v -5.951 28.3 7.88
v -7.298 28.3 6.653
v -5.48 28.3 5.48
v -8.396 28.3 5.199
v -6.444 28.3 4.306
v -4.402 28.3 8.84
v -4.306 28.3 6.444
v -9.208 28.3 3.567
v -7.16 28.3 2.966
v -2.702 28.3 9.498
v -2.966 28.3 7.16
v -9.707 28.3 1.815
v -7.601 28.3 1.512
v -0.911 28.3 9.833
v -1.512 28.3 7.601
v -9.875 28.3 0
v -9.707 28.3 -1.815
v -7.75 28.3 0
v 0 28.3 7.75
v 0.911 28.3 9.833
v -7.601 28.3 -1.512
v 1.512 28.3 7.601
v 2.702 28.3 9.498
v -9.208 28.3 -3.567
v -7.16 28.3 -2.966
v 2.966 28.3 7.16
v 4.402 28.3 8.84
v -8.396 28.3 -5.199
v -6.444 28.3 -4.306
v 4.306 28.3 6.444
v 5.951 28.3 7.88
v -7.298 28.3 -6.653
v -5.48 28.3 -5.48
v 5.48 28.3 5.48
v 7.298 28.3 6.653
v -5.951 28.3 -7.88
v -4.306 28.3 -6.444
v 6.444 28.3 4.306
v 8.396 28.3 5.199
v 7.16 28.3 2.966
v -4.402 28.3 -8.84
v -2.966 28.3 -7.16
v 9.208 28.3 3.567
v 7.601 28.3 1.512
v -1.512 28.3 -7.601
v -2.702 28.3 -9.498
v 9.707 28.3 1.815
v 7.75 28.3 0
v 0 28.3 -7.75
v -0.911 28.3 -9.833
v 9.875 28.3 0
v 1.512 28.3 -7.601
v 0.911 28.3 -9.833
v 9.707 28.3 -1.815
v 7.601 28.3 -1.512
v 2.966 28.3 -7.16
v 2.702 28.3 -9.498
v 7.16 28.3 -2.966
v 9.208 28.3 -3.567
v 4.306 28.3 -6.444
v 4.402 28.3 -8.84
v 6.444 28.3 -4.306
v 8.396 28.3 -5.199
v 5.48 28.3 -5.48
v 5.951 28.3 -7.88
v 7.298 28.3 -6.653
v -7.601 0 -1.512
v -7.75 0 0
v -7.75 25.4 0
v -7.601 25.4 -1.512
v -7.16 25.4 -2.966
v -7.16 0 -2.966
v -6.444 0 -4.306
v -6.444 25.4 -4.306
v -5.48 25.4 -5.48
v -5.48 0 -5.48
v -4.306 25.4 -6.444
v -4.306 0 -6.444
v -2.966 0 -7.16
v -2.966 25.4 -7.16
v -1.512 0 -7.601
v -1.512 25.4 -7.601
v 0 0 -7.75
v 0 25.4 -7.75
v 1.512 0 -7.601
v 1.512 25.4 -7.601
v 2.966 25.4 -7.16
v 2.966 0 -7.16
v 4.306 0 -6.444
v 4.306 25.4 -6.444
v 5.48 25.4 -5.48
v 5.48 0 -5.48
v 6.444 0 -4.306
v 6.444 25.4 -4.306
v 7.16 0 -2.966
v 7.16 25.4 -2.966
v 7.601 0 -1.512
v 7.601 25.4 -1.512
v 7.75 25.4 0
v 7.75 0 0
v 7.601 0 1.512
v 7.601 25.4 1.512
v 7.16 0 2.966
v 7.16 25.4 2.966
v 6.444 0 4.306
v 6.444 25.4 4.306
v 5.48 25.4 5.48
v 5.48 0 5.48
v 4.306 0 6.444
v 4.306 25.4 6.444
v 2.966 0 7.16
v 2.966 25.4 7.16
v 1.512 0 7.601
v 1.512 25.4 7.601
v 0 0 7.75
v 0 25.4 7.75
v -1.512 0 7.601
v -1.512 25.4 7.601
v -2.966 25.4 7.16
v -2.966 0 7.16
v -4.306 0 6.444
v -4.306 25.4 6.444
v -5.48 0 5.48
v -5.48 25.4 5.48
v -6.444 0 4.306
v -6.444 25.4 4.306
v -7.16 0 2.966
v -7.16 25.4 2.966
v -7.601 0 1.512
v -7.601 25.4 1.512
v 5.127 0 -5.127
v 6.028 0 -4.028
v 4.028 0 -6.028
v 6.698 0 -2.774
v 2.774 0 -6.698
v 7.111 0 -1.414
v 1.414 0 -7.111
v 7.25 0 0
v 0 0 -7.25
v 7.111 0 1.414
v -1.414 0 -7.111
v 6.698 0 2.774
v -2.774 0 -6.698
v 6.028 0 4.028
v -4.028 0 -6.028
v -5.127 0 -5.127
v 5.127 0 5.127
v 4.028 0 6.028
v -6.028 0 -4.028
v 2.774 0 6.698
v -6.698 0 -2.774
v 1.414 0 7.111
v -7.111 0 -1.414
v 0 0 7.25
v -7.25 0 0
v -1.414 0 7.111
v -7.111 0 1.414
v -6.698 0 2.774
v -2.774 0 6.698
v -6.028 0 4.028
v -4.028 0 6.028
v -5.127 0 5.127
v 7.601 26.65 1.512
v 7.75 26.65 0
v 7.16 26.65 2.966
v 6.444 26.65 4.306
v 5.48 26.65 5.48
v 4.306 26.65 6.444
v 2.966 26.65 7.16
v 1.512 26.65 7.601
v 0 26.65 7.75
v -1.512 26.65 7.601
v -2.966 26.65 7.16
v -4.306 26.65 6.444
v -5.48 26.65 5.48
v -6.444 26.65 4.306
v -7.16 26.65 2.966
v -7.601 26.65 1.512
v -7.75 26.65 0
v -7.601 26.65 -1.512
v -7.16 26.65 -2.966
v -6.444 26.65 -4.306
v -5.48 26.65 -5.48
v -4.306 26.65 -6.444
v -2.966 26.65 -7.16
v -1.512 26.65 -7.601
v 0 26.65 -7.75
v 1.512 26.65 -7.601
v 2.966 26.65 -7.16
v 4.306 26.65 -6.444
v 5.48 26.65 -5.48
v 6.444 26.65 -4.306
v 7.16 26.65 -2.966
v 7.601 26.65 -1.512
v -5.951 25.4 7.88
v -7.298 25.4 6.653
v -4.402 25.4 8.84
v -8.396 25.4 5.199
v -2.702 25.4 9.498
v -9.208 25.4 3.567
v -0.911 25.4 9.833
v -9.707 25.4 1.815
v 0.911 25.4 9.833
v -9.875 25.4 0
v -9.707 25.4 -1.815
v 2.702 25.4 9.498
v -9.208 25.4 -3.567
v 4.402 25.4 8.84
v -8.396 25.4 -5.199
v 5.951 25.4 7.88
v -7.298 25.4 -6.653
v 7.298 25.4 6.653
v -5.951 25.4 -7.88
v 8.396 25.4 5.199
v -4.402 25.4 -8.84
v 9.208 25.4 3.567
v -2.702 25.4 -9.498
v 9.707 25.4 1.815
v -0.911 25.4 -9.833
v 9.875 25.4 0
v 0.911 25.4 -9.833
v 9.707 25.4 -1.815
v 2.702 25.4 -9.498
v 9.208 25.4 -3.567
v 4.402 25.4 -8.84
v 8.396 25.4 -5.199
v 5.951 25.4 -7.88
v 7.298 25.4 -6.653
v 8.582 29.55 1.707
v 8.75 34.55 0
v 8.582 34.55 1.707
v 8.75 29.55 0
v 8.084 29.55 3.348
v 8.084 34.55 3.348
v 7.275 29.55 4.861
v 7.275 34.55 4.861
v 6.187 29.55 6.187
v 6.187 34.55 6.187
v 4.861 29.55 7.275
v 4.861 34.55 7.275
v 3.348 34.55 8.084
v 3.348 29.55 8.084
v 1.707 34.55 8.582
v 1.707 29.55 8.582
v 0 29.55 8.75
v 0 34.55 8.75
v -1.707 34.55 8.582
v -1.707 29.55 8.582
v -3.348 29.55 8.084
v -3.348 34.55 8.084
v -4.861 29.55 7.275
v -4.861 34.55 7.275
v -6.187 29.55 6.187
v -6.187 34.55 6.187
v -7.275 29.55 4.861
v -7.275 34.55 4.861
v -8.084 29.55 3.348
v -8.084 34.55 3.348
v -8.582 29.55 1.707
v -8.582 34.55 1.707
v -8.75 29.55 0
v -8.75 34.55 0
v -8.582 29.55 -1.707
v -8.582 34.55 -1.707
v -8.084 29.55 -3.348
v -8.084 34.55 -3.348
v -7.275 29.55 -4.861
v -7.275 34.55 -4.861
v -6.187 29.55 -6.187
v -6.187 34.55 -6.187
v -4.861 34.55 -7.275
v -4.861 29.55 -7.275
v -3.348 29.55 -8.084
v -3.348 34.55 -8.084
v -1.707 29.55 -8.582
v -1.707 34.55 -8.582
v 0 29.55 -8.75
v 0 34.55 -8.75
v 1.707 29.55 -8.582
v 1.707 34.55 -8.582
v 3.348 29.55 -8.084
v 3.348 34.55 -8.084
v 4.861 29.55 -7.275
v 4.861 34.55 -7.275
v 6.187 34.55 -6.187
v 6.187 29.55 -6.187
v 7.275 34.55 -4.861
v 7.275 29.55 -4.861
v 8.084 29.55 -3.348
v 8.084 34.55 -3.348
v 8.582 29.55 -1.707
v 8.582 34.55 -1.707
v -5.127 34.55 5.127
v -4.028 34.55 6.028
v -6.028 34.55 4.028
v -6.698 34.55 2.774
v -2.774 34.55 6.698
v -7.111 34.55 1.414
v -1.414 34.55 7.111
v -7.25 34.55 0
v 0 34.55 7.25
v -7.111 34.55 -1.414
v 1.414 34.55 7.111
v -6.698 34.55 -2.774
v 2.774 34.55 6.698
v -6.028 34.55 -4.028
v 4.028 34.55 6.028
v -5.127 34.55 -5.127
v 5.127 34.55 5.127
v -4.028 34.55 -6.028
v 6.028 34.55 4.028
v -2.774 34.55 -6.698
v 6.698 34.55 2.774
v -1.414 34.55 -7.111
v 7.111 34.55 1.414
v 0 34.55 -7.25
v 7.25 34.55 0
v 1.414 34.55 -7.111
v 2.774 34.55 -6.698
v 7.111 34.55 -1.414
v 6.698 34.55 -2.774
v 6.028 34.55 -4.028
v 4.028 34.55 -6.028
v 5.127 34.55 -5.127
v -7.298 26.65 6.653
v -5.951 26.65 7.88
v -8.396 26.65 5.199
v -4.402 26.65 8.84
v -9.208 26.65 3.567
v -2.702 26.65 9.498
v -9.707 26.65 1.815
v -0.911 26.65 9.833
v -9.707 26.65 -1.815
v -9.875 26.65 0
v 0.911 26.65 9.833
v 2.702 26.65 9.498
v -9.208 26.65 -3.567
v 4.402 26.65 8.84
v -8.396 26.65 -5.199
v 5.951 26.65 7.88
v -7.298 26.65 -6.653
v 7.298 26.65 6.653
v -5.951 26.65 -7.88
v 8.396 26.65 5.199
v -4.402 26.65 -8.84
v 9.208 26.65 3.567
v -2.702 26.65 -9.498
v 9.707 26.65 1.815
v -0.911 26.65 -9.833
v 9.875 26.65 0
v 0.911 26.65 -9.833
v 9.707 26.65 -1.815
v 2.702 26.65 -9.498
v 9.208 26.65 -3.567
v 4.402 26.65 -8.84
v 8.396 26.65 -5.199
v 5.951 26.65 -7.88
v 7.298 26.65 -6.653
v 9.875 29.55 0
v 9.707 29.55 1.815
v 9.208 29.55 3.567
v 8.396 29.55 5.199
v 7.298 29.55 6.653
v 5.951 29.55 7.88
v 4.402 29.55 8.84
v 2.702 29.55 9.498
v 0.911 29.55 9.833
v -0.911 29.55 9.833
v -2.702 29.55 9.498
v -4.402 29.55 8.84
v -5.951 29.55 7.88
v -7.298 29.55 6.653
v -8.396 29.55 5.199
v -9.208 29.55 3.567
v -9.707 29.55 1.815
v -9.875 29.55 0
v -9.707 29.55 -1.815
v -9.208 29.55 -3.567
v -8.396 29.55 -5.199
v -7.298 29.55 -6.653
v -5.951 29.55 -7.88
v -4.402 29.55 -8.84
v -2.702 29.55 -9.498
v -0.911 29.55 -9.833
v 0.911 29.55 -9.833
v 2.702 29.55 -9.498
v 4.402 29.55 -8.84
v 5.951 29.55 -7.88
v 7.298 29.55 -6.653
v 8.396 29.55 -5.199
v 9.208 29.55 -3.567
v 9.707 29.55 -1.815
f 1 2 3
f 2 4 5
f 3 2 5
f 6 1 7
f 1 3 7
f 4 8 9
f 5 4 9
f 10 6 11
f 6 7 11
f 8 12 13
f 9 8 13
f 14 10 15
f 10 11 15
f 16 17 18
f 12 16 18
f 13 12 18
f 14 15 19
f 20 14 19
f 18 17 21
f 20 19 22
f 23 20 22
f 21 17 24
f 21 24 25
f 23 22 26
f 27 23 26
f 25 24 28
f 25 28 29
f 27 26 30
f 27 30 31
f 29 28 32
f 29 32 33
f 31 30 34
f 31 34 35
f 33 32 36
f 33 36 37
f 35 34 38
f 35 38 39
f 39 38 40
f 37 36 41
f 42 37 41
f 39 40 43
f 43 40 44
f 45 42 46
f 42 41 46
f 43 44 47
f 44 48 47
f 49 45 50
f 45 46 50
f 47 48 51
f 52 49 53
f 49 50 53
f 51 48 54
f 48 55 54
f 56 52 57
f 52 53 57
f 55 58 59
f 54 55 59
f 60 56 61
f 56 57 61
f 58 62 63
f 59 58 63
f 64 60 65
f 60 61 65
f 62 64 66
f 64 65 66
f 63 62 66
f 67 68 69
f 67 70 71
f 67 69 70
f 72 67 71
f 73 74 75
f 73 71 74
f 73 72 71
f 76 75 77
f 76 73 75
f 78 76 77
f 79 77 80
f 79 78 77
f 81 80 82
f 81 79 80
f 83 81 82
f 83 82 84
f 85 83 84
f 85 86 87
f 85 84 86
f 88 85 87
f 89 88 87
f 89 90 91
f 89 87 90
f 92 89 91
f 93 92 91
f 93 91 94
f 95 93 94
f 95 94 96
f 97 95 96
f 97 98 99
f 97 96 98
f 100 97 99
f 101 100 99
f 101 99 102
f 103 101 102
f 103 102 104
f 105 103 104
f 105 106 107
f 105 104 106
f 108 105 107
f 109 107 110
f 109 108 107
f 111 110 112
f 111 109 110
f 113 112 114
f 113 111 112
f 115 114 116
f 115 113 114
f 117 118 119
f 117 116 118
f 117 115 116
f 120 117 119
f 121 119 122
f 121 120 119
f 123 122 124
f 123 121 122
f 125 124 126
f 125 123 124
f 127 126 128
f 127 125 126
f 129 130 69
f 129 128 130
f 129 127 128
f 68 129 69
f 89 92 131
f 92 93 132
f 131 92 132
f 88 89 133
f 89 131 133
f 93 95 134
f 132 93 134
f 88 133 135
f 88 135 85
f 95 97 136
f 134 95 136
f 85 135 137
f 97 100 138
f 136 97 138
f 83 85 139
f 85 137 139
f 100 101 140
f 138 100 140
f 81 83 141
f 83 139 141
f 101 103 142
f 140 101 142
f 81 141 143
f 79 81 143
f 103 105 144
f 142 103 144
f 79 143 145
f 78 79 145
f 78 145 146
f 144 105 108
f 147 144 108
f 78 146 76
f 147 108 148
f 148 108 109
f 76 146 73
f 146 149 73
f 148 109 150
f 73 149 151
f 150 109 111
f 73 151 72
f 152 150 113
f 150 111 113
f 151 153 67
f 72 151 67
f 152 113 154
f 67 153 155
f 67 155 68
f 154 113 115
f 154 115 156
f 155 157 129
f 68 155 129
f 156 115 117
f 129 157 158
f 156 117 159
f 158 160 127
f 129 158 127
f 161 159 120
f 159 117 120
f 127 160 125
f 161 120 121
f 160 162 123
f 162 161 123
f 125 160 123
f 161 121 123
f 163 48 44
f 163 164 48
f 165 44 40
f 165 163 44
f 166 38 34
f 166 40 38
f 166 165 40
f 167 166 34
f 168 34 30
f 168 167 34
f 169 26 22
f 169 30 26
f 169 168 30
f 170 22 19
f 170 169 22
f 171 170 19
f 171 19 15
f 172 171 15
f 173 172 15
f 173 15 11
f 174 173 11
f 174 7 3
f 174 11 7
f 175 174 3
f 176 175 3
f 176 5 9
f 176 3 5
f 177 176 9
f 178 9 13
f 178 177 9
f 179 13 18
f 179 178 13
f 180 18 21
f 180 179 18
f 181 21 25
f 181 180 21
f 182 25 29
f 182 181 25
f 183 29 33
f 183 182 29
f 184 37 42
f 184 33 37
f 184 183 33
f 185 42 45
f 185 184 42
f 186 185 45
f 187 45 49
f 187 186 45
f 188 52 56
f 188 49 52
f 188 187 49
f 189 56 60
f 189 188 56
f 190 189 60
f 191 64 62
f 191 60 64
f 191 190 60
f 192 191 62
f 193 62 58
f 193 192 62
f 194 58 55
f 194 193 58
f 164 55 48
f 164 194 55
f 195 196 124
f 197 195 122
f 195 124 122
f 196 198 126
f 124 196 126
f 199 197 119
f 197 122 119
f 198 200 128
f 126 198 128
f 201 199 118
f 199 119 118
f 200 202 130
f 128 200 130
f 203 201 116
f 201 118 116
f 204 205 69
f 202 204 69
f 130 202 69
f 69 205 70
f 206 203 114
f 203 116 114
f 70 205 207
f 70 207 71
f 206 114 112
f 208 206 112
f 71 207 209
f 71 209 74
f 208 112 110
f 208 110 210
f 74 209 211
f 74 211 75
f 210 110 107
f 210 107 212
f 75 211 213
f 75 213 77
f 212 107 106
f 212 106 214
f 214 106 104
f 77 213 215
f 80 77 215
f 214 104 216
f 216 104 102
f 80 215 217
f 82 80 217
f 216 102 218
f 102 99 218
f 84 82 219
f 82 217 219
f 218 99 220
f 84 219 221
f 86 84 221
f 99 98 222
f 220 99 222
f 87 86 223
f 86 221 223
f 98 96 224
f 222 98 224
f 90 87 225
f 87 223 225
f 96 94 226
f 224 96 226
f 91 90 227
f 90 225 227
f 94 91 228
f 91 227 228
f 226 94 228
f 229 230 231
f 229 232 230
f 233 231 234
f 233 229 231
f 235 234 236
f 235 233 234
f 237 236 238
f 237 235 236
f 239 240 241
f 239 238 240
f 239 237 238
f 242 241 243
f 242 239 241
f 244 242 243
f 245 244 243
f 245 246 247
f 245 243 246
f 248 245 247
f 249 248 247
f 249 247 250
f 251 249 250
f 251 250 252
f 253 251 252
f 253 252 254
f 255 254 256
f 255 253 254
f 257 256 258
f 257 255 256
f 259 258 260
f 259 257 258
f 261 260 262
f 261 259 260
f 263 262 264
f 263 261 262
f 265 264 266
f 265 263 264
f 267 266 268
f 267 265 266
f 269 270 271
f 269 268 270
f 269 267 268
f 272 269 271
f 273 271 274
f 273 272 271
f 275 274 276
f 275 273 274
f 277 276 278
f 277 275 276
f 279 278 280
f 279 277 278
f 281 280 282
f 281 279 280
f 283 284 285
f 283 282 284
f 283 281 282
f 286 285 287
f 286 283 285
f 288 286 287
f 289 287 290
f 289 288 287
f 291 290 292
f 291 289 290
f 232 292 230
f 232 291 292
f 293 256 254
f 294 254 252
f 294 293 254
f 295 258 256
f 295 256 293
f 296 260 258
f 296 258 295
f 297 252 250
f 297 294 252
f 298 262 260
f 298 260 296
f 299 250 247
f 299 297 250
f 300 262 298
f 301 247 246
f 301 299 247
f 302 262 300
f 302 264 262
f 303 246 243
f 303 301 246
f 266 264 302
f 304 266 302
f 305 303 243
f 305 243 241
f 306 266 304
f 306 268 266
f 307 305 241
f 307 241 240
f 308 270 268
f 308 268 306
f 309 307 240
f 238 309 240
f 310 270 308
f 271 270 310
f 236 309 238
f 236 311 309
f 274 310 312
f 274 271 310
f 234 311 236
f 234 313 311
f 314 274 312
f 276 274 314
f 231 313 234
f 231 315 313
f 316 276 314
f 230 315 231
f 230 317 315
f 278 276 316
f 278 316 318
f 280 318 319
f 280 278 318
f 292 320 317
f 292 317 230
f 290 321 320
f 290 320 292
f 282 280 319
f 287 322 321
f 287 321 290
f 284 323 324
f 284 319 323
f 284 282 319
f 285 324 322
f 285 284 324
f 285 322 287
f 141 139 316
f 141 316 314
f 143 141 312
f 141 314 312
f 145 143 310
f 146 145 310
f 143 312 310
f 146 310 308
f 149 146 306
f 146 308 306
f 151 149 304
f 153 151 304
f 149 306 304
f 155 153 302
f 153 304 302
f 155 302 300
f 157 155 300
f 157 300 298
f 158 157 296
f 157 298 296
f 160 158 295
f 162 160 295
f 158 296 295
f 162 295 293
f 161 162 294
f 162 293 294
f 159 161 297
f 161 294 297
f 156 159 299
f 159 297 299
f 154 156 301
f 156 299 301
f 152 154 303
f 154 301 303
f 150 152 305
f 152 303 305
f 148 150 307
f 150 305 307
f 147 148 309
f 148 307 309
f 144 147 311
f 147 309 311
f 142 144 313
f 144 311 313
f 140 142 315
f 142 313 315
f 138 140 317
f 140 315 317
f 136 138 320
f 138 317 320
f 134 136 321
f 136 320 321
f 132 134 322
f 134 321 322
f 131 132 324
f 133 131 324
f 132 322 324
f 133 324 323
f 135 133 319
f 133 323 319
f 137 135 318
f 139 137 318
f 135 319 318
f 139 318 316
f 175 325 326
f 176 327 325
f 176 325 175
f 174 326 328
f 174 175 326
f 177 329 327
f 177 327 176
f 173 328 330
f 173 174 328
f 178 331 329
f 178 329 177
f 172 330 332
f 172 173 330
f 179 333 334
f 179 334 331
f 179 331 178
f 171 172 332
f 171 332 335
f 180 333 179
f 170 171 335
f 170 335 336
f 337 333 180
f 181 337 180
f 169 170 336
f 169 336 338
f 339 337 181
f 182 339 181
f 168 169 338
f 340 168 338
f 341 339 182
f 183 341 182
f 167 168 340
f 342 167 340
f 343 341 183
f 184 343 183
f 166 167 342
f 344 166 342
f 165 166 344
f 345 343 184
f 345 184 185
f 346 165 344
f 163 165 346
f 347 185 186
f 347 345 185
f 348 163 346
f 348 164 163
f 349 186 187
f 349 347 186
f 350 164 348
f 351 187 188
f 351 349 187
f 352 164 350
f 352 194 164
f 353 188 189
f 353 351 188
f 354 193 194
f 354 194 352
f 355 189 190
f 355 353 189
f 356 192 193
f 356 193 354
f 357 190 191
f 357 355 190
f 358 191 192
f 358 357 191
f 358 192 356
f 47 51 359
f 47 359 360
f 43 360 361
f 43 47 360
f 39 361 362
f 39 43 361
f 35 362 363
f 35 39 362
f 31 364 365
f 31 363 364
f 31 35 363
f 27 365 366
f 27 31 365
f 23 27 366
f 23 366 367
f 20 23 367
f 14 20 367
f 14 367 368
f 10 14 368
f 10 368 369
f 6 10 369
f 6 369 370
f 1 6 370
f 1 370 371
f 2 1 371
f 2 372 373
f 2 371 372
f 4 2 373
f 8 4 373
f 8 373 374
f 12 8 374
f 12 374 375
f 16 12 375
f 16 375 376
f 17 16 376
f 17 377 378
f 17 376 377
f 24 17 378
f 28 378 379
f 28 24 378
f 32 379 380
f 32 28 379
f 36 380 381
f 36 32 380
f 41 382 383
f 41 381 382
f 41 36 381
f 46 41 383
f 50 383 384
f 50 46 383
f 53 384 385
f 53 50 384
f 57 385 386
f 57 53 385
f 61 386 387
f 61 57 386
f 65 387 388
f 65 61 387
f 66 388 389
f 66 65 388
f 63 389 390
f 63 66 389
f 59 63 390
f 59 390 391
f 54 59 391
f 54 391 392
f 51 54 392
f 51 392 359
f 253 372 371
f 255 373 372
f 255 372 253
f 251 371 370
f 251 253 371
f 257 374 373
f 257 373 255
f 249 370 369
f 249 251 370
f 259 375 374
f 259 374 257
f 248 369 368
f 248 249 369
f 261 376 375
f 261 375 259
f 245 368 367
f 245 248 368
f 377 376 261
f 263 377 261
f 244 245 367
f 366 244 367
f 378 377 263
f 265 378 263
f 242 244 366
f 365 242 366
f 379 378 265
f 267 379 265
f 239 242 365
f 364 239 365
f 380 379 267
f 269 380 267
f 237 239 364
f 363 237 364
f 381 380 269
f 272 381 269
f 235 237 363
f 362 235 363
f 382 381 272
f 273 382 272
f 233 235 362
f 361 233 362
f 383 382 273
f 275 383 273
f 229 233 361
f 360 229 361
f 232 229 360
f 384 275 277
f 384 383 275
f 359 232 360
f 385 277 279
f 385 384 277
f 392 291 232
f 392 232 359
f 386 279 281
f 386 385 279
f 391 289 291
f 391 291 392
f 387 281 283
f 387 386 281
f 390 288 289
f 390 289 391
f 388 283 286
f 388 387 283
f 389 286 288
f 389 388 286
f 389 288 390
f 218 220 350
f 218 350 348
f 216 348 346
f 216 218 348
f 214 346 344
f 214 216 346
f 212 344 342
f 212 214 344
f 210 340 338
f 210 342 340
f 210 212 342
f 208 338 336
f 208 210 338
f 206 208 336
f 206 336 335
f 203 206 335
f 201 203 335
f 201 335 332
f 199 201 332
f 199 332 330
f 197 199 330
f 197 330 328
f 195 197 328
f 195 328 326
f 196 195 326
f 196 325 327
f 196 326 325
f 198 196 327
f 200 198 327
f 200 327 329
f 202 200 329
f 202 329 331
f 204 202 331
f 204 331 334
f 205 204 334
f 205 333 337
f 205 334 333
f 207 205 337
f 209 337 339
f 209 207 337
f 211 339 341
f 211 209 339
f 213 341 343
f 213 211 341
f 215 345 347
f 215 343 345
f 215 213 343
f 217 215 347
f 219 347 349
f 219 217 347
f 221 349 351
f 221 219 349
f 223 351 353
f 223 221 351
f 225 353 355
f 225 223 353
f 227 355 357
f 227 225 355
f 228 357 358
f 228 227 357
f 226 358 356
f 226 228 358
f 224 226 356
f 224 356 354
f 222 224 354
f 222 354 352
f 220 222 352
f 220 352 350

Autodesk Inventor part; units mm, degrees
ref_plane "YZ Plane" through (0, 0, 0) normal (1, 0, 0) x (0, 1, 0)
ref_plane "XZ Plane" through (0, 0, 0) normal (0, 1, 0) x (-1, 0, 0)
ref_plane "XY Plane" through (0, 0, 0) normal (0, 0, 1) x (1, 0, 0)
sketch "Sketch1" plane through (0, 0, 0) normal (0, 1, 0) x (-1, 0, 0)
  circle A0 centre (0, 0) radius 7.75
  dimension "d0" = 15.5
extrude "Extrusion1" add sketch "Sketch1" along normal blind 25.4
sketch "Sketch2" plane through (0, 25.4, 0) normal (0, 1, 0) x (1, 0, 0)
  circle A0 centre (0, 0) radius 7.75 projected
  circle A1 centre (0, 0) radius 9.875
  dimension "d3" = 19.75
extrude "Extrusion2" add sketch "Sketch2" along normal blind 1.25 contours A0 | A1
sketch "Sketch3" plane through (0, 26.65, 0) normal (0, 1, 0) x (1, 0, 0)
  circle A0 centre (0, 0) radius 9.875 projected
  circle A1 centre (0, 0) radius 7.75
  dimension "d6" = 15.5
extrude "Extrusion3" add sketch "Sketch3" along normal blind 1.65 contours A1
sketch "Sketch4" plane through (0, 28.3, 0) normal (0, 1, 0) x (1, 0, 0)
  circle A0 centre (0, 0) radius 7.75 projected
  circle A1 centre (0, 0) radius 9.875
  dimension "d9" = 19.75
extrude "Extrusion4" add sketch "Sketch4" along normal blind 1.25 contours A0 | A1
sketch "Sketch5" plane through (0, 29.55, 0) normal (0, 1, 0) x (1, 0, 0)
  circle A0 centre (0, 0) radius 9.875 projected
  circle A1 centre (0, 0) radius 8.75
  dimension "d12" = 17.5
extrude "Extrusion5" add sketch "Sketch5" along normal blind 5 contours A1
thread "Thread1" size "M18x0.75" class "6g" standard "ANSI Metric M Profile" full length
hole "Hole1" at (0, 0, 0) direction (0, 1, 0) diameter 14.5 end through all
properties part number "Plunger" material "ABS Plastic"
